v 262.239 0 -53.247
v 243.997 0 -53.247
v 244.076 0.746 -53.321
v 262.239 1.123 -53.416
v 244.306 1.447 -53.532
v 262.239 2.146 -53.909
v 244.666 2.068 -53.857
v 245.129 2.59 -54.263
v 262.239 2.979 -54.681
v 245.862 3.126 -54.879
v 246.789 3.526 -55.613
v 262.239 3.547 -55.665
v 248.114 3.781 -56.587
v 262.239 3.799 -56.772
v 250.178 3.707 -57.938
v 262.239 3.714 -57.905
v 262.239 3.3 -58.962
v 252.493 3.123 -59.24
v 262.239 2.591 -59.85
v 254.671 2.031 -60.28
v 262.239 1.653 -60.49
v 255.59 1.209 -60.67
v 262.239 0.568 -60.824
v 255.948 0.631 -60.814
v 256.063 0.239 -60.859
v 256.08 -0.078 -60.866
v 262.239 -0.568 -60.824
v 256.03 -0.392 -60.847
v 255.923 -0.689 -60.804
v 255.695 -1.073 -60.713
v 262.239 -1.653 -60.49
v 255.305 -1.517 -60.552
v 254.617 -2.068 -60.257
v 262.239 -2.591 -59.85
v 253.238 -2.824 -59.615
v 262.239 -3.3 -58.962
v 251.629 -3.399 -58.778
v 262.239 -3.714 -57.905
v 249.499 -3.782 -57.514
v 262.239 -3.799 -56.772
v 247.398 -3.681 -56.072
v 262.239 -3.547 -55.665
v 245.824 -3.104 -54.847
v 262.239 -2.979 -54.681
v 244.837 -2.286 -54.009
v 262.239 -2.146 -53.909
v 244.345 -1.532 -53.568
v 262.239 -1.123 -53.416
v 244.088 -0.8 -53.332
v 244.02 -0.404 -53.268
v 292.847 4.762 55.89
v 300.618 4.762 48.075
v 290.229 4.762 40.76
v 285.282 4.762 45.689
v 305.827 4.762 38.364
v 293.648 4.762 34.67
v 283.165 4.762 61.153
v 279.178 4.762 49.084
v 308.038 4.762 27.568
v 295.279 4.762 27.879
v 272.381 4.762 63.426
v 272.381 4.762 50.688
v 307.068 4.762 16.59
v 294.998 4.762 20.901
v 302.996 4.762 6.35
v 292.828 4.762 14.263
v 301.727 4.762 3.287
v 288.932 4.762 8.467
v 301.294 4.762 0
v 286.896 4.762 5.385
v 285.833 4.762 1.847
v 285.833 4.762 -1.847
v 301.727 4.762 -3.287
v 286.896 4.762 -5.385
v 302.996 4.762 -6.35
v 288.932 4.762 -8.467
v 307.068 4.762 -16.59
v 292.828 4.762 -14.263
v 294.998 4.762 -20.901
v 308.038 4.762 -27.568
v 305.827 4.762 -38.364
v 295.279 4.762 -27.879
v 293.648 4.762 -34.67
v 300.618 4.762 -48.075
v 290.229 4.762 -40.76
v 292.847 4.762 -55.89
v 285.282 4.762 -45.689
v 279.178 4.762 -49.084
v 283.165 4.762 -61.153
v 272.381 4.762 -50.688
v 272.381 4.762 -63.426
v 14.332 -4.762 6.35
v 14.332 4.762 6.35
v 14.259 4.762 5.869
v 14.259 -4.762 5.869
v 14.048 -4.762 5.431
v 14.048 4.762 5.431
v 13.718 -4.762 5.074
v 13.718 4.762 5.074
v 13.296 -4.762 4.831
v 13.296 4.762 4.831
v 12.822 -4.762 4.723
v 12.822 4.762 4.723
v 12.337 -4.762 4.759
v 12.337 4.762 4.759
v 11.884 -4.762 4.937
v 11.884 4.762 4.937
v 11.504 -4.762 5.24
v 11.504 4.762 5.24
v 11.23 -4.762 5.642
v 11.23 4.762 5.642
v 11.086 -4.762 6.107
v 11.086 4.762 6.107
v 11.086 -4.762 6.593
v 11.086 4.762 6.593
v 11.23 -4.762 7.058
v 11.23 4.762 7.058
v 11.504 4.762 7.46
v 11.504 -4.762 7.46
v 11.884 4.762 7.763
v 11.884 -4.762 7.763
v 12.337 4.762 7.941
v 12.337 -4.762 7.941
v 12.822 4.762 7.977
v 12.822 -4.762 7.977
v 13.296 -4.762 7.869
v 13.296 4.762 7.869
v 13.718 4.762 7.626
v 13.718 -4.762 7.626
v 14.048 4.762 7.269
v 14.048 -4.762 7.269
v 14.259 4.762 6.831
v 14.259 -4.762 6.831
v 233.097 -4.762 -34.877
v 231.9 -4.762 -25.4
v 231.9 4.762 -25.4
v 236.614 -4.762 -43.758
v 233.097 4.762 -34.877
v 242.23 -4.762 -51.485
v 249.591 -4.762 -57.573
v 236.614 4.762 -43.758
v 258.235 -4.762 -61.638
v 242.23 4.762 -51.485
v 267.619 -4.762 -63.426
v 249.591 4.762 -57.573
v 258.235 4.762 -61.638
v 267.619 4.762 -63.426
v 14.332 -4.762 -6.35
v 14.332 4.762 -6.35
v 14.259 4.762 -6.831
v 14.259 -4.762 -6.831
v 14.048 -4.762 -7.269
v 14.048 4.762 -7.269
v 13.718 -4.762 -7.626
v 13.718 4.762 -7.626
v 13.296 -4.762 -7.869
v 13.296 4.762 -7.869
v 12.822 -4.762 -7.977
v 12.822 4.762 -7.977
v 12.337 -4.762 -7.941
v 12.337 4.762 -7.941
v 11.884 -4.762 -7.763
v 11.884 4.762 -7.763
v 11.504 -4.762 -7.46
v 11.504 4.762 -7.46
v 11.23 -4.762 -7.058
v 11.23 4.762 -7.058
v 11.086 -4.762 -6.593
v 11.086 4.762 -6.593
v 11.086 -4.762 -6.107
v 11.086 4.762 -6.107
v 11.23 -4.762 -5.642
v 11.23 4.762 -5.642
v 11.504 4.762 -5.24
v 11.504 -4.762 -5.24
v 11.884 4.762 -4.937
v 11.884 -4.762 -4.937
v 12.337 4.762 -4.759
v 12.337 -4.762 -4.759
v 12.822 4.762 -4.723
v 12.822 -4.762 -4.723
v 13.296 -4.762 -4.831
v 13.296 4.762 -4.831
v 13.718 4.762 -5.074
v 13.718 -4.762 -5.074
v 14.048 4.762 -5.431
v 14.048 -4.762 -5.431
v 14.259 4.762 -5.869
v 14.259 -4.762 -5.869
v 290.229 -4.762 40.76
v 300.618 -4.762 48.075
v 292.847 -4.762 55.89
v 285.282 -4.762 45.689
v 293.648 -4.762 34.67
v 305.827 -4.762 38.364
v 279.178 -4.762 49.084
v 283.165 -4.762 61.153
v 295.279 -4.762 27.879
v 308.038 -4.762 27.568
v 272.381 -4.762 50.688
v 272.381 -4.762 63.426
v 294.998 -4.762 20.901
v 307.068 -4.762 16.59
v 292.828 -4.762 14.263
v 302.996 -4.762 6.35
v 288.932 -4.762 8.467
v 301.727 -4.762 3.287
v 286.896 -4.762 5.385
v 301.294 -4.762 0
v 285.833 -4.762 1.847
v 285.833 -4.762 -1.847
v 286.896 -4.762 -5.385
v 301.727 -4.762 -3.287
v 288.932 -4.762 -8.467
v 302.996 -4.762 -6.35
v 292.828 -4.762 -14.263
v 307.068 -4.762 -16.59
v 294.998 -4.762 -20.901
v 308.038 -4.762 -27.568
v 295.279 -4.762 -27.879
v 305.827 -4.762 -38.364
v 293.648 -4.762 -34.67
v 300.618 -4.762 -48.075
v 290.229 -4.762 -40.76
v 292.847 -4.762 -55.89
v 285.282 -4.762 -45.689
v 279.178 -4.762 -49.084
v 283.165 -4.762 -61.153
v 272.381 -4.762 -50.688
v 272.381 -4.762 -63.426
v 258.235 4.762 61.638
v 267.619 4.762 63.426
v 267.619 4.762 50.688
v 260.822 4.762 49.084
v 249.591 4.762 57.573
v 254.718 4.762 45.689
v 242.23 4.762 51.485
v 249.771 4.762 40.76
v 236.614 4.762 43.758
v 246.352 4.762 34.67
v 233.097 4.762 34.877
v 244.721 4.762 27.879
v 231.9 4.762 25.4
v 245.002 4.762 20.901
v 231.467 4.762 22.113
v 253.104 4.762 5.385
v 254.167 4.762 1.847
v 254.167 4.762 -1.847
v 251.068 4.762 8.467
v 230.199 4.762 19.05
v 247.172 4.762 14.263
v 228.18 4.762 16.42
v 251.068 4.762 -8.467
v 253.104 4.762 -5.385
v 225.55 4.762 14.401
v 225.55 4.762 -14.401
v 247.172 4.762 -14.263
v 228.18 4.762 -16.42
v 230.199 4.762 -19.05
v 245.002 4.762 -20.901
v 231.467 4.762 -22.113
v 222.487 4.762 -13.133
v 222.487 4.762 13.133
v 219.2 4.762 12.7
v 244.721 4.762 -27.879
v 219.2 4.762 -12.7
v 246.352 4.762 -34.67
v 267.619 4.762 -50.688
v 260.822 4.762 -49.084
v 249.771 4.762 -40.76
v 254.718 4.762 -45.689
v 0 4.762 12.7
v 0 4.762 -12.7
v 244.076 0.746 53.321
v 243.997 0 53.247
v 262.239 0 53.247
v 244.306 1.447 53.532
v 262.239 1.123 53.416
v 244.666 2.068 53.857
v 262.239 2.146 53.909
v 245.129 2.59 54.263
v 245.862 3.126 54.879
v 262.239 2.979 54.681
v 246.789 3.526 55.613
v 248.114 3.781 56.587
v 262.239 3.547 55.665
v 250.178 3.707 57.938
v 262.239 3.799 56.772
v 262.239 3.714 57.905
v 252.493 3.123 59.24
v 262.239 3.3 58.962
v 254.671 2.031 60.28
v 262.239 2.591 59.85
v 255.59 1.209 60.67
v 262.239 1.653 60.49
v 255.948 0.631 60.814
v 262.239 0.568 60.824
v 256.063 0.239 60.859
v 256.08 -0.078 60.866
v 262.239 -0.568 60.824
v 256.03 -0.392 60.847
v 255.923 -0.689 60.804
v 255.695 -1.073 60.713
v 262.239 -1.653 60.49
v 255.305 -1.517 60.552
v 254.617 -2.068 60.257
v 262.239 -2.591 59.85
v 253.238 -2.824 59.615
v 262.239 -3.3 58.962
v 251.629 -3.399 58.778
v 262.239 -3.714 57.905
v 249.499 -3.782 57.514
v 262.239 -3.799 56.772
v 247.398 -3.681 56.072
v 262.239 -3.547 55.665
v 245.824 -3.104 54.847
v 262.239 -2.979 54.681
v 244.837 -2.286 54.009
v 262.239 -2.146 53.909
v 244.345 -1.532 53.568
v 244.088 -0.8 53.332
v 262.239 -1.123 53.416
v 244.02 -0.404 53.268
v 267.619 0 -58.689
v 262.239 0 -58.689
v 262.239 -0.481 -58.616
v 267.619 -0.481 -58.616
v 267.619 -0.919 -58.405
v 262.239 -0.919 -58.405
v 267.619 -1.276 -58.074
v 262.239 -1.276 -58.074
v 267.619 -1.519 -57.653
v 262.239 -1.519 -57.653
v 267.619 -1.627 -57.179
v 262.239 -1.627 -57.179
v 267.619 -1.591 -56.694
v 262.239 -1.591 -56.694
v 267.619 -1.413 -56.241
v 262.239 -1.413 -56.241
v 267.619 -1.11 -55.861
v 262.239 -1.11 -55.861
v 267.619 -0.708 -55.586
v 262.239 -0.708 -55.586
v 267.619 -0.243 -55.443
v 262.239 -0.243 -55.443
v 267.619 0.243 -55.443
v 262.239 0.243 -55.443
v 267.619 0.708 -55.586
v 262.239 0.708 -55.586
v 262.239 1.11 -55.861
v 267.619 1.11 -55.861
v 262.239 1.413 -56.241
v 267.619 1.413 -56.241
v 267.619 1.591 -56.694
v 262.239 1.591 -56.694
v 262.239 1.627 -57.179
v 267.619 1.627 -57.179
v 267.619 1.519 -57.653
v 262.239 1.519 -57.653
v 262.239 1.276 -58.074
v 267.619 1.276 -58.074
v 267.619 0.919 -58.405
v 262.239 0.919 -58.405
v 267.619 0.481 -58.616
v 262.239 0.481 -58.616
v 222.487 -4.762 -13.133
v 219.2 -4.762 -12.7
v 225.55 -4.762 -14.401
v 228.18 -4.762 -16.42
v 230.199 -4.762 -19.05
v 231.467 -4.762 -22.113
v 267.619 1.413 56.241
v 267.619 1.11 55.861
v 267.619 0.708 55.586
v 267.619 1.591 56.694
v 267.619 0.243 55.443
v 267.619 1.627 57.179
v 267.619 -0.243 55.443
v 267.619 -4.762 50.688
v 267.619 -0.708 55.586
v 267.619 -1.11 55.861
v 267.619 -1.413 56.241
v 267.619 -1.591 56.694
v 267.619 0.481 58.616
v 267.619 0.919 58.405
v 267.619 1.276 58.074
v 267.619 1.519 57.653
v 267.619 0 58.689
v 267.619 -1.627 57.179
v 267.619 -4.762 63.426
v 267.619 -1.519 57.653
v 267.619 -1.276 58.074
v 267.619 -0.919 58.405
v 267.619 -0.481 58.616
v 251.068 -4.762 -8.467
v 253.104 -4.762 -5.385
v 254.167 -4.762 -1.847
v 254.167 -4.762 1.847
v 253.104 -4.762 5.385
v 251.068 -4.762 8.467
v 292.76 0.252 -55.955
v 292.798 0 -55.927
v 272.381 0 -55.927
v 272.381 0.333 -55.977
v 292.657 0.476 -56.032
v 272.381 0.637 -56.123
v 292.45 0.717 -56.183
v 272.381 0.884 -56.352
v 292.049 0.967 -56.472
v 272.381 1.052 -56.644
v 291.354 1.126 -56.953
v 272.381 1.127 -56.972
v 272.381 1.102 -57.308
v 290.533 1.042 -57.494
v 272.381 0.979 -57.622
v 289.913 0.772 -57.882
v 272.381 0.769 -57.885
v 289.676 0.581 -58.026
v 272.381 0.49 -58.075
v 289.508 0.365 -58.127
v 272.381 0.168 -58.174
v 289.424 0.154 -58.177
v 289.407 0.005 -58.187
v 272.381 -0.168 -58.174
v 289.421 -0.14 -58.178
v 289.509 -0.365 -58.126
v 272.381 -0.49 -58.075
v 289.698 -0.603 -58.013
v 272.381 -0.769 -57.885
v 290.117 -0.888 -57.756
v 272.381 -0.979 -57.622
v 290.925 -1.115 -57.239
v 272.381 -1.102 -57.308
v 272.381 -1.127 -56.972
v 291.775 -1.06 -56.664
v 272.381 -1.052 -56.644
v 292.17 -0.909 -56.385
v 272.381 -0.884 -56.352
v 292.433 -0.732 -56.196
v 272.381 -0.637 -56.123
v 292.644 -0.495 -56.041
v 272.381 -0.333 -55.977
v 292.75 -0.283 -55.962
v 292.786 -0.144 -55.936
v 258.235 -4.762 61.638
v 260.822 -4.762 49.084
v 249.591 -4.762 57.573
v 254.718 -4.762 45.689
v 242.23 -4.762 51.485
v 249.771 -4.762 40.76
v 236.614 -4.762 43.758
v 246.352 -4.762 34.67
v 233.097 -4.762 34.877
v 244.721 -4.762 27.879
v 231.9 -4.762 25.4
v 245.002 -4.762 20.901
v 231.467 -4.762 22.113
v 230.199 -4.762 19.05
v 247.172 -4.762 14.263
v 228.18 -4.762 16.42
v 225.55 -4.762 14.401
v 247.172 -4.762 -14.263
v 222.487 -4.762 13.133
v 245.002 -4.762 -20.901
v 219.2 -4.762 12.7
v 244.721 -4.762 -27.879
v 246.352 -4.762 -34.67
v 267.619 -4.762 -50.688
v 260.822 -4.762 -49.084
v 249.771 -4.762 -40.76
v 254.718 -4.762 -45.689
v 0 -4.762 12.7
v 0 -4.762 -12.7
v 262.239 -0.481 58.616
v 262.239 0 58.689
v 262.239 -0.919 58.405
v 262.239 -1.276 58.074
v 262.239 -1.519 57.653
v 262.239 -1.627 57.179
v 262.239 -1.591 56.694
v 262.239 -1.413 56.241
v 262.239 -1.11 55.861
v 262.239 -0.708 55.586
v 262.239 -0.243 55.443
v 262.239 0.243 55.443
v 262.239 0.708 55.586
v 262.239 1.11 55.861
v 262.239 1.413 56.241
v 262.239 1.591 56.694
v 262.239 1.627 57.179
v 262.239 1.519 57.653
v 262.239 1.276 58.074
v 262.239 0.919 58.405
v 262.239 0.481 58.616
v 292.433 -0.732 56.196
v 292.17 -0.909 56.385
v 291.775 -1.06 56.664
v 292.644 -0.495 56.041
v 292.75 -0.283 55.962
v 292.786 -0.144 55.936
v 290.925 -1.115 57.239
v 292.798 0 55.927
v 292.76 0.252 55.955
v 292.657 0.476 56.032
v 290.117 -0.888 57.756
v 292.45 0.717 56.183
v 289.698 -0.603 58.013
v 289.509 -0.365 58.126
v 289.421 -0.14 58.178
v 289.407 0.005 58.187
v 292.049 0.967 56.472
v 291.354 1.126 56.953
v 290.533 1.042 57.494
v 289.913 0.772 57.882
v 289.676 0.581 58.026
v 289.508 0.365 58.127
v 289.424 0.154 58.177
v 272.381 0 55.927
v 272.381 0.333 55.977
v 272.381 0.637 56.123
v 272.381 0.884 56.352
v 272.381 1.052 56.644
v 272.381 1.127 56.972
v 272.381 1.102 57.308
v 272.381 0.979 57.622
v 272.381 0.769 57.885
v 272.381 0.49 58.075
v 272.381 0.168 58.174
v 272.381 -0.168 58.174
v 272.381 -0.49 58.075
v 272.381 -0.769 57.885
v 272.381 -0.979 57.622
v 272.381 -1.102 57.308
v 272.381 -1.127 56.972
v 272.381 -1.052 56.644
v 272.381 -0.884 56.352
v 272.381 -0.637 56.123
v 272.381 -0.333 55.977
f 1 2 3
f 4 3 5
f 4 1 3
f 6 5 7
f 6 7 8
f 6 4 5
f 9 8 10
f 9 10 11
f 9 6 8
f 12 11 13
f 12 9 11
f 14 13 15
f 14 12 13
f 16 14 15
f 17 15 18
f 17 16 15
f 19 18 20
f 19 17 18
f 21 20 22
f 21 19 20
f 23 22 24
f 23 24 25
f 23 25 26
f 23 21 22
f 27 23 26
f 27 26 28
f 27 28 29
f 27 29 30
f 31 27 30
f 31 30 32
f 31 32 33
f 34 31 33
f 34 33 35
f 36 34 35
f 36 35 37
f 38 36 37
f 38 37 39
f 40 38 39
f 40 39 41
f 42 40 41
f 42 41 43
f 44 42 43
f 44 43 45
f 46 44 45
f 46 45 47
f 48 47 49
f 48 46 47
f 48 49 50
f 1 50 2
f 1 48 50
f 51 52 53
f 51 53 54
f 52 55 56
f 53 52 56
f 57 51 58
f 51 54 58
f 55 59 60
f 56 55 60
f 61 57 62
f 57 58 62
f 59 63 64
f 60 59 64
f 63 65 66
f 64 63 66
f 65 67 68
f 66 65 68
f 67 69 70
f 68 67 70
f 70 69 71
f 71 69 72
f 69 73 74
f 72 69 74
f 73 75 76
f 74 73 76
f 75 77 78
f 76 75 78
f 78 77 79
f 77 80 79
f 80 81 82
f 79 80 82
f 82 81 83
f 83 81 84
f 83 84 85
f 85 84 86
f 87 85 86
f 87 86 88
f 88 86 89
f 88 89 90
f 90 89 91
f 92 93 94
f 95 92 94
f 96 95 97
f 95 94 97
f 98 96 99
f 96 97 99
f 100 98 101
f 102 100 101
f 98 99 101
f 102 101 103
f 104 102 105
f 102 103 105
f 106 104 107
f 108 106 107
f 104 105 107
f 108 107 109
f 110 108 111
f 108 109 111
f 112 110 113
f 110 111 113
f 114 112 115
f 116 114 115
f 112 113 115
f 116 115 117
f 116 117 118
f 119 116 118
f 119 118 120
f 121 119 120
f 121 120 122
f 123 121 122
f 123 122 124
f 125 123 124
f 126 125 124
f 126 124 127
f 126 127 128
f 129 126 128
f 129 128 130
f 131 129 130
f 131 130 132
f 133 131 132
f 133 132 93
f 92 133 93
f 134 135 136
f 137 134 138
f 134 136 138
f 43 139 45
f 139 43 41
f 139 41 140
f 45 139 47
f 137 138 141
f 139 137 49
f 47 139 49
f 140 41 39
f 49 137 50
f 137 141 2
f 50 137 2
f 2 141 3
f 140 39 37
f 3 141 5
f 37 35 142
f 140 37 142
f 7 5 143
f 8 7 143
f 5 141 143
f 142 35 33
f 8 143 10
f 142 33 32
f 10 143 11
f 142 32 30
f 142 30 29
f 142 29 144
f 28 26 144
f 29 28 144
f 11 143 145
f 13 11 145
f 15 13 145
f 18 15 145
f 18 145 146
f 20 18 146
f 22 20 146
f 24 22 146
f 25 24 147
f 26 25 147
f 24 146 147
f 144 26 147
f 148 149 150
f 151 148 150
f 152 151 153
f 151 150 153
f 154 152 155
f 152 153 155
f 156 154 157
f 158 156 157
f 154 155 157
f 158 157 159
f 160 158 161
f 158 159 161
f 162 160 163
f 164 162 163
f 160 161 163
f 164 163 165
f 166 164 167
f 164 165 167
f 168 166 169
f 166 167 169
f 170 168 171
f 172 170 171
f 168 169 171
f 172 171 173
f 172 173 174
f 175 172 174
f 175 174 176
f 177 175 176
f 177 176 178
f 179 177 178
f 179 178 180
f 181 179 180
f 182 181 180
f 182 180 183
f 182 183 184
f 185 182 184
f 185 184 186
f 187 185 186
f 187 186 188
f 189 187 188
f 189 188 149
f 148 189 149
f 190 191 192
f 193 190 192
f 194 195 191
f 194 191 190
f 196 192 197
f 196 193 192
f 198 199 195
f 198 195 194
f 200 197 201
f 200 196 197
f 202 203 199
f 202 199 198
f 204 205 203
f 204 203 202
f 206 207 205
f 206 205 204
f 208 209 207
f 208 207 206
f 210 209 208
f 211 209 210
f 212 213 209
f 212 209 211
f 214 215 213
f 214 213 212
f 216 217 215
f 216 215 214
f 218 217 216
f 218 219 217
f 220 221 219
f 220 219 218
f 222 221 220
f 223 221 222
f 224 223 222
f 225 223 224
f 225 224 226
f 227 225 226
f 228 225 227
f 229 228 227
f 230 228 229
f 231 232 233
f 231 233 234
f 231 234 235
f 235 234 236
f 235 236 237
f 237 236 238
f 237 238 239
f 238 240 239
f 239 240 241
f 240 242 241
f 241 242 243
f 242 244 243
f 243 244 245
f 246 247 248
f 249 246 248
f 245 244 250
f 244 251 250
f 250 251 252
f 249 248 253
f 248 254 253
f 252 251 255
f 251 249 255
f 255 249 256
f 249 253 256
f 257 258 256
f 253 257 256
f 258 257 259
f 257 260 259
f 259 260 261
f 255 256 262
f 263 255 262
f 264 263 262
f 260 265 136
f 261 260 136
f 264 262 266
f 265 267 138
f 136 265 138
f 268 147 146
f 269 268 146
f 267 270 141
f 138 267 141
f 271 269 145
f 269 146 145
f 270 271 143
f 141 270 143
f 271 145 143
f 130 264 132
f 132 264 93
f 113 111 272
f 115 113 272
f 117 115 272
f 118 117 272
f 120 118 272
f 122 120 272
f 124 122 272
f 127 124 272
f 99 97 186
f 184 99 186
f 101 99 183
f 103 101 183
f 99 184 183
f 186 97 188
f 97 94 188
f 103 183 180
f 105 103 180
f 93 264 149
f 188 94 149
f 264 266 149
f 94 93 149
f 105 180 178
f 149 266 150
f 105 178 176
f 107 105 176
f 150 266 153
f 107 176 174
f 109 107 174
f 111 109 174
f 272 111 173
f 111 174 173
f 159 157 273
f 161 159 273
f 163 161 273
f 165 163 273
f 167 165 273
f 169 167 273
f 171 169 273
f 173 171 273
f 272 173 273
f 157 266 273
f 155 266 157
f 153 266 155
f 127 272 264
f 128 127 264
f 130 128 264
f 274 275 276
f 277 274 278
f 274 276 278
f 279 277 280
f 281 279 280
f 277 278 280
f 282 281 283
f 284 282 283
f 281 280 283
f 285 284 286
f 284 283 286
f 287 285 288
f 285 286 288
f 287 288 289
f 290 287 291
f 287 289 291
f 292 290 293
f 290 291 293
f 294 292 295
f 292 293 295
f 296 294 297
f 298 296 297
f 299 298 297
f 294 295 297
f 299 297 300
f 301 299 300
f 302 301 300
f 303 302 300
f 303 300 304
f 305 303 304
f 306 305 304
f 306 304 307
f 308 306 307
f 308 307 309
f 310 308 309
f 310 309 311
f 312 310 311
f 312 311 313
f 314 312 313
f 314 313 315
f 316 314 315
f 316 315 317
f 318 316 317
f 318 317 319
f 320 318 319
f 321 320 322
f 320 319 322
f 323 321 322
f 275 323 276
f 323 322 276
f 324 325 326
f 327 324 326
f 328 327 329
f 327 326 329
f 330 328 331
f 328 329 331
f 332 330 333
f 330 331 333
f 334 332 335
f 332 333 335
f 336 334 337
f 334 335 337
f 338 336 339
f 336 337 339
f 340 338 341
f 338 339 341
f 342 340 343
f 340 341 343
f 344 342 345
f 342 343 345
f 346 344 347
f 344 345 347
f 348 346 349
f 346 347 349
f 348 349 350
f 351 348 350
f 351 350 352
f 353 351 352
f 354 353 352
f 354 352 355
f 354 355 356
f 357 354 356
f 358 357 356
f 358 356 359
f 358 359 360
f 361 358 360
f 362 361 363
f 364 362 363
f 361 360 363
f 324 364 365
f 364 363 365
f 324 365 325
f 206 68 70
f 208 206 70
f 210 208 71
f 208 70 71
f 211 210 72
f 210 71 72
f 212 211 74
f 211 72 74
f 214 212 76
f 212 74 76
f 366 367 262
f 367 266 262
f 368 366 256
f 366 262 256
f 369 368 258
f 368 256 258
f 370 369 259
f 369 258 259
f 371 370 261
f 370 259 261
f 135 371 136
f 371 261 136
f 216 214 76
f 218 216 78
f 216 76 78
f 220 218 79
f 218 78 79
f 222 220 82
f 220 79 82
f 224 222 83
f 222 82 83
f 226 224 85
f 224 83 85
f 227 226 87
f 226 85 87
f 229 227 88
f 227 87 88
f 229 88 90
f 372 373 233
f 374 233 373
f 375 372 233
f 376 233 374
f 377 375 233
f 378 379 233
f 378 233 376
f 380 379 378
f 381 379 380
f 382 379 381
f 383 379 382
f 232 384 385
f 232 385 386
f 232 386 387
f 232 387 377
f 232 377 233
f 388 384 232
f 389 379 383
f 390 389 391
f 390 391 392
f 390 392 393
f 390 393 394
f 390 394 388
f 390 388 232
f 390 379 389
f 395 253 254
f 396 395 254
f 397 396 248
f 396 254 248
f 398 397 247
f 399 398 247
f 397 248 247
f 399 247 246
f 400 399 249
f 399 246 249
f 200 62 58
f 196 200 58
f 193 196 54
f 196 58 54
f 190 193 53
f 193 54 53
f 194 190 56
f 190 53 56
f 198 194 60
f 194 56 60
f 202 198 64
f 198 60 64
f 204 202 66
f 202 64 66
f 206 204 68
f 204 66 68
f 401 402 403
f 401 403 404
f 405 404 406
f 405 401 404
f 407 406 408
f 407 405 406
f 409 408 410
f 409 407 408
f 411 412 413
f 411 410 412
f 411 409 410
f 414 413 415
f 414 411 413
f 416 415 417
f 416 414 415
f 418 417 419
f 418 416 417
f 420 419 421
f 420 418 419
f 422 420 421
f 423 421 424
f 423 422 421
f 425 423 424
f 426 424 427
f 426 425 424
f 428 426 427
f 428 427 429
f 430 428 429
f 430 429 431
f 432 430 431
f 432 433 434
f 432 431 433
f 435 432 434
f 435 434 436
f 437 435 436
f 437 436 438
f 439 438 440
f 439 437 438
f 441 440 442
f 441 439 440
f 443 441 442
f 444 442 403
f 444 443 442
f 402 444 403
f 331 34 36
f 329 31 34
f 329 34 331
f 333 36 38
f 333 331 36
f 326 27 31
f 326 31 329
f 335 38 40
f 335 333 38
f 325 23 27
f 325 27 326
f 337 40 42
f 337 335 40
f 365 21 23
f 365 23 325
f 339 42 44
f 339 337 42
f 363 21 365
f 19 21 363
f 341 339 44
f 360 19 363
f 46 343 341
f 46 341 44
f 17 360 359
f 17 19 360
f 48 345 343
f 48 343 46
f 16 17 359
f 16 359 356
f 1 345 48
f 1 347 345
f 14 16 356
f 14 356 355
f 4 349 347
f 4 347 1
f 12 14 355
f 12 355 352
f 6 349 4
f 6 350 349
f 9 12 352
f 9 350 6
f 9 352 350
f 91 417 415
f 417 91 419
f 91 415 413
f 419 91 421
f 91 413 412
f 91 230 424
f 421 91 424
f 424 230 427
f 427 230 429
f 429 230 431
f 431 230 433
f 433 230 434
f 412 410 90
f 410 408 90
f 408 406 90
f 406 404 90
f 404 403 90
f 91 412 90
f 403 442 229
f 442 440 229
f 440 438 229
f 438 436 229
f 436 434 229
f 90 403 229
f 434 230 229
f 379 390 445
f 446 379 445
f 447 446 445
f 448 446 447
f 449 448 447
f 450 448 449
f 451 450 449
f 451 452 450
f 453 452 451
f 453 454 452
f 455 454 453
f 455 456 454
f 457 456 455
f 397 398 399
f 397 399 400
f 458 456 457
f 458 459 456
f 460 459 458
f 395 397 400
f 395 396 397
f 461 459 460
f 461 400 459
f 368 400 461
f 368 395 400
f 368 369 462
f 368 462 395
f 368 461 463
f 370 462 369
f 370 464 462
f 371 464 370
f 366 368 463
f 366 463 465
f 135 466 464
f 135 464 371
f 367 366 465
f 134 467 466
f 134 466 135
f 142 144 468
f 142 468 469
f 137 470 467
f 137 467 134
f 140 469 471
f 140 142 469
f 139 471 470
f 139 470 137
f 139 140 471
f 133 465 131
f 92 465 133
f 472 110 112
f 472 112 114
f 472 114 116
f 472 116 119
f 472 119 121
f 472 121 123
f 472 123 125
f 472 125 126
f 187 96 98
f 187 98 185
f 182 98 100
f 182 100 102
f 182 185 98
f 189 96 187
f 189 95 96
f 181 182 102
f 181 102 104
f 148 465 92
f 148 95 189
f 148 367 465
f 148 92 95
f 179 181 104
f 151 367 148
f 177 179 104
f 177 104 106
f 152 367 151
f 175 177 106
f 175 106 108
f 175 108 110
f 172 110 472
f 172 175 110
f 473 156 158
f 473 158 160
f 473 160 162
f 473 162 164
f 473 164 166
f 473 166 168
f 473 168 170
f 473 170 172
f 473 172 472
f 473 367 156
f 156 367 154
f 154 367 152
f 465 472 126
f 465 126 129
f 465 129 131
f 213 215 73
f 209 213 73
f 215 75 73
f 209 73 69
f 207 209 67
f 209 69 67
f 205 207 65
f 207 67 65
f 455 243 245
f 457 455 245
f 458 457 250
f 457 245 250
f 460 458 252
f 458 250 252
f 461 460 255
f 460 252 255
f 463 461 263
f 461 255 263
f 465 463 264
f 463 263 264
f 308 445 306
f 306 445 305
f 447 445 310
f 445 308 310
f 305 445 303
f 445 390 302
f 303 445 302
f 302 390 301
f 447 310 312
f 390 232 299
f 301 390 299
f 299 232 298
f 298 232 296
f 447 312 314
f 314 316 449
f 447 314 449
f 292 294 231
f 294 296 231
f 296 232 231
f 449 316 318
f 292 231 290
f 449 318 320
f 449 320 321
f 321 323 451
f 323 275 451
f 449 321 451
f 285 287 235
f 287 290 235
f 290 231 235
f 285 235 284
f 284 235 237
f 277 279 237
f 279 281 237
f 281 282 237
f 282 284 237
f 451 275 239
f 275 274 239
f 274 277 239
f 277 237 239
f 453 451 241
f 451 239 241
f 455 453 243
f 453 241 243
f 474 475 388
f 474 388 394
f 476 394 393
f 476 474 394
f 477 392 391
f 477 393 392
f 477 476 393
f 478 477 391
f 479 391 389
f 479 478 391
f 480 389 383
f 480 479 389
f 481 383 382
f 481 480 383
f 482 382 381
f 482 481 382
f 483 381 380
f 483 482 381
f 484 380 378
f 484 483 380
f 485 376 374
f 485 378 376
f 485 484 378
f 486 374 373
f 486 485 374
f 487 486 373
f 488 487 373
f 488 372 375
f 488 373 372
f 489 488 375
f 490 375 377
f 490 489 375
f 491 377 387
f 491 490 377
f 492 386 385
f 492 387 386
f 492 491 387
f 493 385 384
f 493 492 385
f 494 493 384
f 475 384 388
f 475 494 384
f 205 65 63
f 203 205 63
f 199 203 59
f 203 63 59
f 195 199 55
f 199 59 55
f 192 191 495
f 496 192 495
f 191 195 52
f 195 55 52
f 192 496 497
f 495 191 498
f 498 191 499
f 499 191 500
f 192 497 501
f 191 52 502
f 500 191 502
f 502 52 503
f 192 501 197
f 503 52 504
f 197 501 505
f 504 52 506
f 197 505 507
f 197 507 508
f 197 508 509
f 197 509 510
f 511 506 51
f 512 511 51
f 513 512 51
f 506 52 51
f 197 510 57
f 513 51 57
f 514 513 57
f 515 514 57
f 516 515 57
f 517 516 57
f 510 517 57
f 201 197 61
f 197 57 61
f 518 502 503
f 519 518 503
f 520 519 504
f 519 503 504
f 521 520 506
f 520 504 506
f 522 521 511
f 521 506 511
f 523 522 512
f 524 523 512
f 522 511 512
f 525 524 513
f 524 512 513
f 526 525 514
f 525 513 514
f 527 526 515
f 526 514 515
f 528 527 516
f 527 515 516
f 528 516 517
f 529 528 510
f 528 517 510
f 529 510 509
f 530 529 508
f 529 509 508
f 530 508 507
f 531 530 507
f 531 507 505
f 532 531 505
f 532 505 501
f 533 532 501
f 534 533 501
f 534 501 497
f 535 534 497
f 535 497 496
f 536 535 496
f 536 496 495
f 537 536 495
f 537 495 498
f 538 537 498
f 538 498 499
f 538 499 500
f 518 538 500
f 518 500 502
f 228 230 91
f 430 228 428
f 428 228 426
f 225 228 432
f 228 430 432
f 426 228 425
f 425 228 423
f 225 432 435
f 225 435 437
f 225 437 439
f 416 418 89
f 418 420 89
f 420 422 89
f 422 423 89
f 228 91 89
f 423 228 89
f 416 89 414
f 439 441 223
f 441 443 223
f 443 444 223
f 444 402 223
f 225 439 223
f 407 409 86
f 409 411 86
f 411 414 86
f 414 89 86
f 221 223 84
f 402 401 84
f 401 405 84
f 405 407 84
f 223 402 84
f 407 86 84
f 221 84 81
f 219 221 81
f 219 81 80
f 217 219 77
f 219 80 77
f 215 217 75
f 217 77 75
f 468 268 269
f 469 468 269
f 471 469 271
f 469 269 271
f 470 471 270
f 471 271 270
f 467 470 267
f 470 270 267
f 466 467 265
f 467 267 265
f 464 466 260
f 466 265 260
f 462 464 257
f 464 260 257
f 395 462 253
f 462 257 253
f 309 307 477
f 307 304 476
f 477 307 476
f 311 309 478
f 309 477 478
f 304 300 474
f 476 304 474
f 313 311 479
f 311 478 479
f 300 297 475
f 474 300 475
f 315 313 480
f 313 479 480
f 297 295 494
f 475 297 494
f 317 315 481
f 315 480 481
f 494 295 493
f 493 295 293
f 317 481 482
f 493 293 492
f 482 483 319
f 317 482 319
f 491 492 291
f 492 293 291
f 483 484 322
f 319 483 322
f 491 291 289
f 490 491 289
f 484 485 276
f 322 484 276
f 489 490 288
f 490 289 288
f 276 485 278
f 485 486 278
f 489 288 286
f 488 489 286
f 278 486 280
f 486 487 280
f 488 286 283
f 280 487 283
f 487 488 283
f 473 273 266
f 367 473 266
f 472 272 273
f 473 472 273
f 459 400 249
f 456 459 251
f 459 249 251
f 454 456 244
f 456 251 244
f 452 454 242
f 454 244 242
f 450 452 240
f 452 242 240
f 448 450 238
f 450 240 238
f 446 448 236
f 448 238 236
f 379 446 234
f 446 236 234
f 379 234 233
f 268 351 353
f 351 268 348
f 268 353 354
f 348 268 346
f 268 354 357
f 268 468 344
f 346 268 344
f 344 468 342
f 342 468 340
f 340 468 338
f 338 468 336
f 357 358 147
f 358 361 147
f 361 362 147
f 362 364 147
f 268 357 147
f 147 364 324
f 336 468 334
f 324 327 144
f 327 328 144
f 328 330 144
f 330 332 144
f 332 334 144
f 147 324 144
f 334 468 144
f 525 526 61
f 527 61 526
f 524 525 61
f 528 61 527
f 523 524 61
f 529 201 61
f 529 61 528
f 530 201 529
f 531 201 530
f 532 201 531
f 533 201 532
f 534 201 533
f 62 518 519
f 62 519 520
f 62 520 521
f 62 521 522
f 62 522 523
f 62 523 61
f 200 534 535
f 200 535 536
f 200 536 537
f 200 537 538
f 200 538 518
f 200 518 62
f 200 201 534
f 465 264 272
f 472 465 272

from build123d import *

# Parameters (mm, degrees)
BOSS_EXTRUDE1_DEPTH   = 4.7625
F_4_CLEARANCE_HOLE1_D = 3.2639
CUT_EXTRUDE1_DEPTH    = 10.525
CUT_EXTRUDE2_START    = 7.9375
SKETCH26_R            = 3.81
CUT_EXTRUDE2_DEPTH    = 263.239436686
F_4_40_TAPPED_HOLE1_D = 2.2606


with BuildPart() as part:
    # Sketch2 → Boss-Extrude1 (new body, symmetric)
    with BuildSketch(Plane(origin=(0, 0, 0), x_dir=(1, 0, 0), z_dir=(0, 1, 0))):
        with BuildLine():
            Line((0, 12.7), (219.2, 12.7))
            ThreePointArc((219.2, 12.7), (228.180256121, 16.419743879), (231.9, 25.4))
            ThreePointArc((231.9, 25.4), (279.861005618, 62.201773982), (302.995567884, 6.35))
            ThreePointArc((302.995567884, 6.35), (301.294090512, 0), (302.995567884, -6.35))
            ThreePointArc((302.995567884, -6.35), (279.861005618, -62.201773982), (231.9, -25.4))
            ThreePointArc((231.9, -25.4), (228.180256121, -16.419743879), (219.2, -12.7))
            Line((219.2, -12.7), (0, -12.7))
            Line((0, -12.7), (0, 12.7))
        make_face()
        with BuildLine():
            ThreePointArc((288.932042209, 8.466666667), (270, 50.8), (251.067957791, 8.466666667))
            ThreePointArc((251.067957791, 8.466666667), (254.301936686, 0), (251.067957791, -8.466666667))
            ThreePointArc((251.067957791, -8.466666667), (270, -50.8), (288.932042209, -8.466666667))
            ThreePointArc((288.932042209, -8.466666667), (285.698063314, 0), (288.932042209, 8.466666667))
        make_face(mode=Mode.SUBTRACT)
    extrude(amount=BOSS_EXTRUDE1_DEPTH, both=True)

    # #4 Clearance Hole1 (through all)
    with Locations(Plane(origin=(0, -4.7625, 0), x_dir=(-1, 0, 0), z_dir=(0, -1, 0))):
        with Locations((-12.7, -6.35), (-12.7, 6.35)):
            Hole(F_4_CLEARANCE_HOLE1_D / 2)

    # Sketch14 → Cut-Extrude1 (cut, through all)
    with BuildSketch(Plane.XZ.offset(4.7625)):
        with BuildLine():
            Line((267.61875, -50.688132561), (267.61875, -63.425513125))
            ThreePointArc((267.61875, -63.425513125), (270, -63.5), (272.38125, -63.425513125))
            Line((272.38125, -63.425513125), (272.38125, -50.688132561))
            ThreePointArc((272.38125, -50.688132561), (270, -50.8), (267.61875, -50.688132561))
        make_face()
        with BuildLine():
            Line((267.61875, 50.688132561), (267.61875, 63.425513125))
            ThreePointArc((267.61875, 63.425513125), (270, 63.5), (272.38125, 63.425513125))
            Line((272.38125, 63.425513125), (272.38125, 50.688132561))
            ThreePointArc((272.38125, 50.688132561), (270, 50.8), (267.61875, 50.688132561))
        make_face()
    extrude(amount=-CUT_EXTRUDE1_DEPTH, mode=Mode.SUBTRACT)

    # Sketch21 → #4 Clearance Hole2 (revolve, cut)
    with BuildSketch(Plane(origin=(254.301936686, 0, 57.056822843), x_dir=(0, 0, 1), z_dir=(0, 1, 0))):
        Polygon((0, 0), (0, 18.078313314), (1.63195, 17.097738827), (1.63195, 0), align=None)
    f_4_clearance_hole2 = revolve(axis=Axis((247.951936686, 0, 57.056822843), (1, 0, 0)), mode=Mode.SUBTRACT)

    # Sketch26 → Cut-Extrude2 (cut, through all)
    with BuildSketch(Plane(origin=(254.301936686, 0, 0), x_dir=(0, 0, -1), z_dir=(1, 0, 0)).offset(CUT_EXTRUDE2_START)):
        with Locations((-57.056822843, 0)):
            Circle(SKETCH26_R)
    cut_extrude2 = extrude(amount=-CUT_EXTRUDE2_DEPTH, mode=Mode.SUBTRACT)

    # #4-40 Tapped Hole1 (through all)
    with Locations(Plane.ZY.offset(-272.38125)):
        with Locations((57.056822843, 0)):
            f_4_40_tapped_hole1 = Hole(F_4_40_TAPPED_HOLE1_D / 2)

    # Mirror1: #4 Clearance Hole2, Cut-Extrude2, #4-40 Tapped Hole1 across plane
    add(f_4_clearance_hole2.mirror(Plane.XY), mode=Mode.SUBTRACT)
    add(cut_extrude2.mirror(Plane.XY), mode=Mode.SUBTRACT)
    add(f_4_40_tapped_hole1.mirror(Plane.XY), mode=Mode.SUBTRACT)


solid = part.part
